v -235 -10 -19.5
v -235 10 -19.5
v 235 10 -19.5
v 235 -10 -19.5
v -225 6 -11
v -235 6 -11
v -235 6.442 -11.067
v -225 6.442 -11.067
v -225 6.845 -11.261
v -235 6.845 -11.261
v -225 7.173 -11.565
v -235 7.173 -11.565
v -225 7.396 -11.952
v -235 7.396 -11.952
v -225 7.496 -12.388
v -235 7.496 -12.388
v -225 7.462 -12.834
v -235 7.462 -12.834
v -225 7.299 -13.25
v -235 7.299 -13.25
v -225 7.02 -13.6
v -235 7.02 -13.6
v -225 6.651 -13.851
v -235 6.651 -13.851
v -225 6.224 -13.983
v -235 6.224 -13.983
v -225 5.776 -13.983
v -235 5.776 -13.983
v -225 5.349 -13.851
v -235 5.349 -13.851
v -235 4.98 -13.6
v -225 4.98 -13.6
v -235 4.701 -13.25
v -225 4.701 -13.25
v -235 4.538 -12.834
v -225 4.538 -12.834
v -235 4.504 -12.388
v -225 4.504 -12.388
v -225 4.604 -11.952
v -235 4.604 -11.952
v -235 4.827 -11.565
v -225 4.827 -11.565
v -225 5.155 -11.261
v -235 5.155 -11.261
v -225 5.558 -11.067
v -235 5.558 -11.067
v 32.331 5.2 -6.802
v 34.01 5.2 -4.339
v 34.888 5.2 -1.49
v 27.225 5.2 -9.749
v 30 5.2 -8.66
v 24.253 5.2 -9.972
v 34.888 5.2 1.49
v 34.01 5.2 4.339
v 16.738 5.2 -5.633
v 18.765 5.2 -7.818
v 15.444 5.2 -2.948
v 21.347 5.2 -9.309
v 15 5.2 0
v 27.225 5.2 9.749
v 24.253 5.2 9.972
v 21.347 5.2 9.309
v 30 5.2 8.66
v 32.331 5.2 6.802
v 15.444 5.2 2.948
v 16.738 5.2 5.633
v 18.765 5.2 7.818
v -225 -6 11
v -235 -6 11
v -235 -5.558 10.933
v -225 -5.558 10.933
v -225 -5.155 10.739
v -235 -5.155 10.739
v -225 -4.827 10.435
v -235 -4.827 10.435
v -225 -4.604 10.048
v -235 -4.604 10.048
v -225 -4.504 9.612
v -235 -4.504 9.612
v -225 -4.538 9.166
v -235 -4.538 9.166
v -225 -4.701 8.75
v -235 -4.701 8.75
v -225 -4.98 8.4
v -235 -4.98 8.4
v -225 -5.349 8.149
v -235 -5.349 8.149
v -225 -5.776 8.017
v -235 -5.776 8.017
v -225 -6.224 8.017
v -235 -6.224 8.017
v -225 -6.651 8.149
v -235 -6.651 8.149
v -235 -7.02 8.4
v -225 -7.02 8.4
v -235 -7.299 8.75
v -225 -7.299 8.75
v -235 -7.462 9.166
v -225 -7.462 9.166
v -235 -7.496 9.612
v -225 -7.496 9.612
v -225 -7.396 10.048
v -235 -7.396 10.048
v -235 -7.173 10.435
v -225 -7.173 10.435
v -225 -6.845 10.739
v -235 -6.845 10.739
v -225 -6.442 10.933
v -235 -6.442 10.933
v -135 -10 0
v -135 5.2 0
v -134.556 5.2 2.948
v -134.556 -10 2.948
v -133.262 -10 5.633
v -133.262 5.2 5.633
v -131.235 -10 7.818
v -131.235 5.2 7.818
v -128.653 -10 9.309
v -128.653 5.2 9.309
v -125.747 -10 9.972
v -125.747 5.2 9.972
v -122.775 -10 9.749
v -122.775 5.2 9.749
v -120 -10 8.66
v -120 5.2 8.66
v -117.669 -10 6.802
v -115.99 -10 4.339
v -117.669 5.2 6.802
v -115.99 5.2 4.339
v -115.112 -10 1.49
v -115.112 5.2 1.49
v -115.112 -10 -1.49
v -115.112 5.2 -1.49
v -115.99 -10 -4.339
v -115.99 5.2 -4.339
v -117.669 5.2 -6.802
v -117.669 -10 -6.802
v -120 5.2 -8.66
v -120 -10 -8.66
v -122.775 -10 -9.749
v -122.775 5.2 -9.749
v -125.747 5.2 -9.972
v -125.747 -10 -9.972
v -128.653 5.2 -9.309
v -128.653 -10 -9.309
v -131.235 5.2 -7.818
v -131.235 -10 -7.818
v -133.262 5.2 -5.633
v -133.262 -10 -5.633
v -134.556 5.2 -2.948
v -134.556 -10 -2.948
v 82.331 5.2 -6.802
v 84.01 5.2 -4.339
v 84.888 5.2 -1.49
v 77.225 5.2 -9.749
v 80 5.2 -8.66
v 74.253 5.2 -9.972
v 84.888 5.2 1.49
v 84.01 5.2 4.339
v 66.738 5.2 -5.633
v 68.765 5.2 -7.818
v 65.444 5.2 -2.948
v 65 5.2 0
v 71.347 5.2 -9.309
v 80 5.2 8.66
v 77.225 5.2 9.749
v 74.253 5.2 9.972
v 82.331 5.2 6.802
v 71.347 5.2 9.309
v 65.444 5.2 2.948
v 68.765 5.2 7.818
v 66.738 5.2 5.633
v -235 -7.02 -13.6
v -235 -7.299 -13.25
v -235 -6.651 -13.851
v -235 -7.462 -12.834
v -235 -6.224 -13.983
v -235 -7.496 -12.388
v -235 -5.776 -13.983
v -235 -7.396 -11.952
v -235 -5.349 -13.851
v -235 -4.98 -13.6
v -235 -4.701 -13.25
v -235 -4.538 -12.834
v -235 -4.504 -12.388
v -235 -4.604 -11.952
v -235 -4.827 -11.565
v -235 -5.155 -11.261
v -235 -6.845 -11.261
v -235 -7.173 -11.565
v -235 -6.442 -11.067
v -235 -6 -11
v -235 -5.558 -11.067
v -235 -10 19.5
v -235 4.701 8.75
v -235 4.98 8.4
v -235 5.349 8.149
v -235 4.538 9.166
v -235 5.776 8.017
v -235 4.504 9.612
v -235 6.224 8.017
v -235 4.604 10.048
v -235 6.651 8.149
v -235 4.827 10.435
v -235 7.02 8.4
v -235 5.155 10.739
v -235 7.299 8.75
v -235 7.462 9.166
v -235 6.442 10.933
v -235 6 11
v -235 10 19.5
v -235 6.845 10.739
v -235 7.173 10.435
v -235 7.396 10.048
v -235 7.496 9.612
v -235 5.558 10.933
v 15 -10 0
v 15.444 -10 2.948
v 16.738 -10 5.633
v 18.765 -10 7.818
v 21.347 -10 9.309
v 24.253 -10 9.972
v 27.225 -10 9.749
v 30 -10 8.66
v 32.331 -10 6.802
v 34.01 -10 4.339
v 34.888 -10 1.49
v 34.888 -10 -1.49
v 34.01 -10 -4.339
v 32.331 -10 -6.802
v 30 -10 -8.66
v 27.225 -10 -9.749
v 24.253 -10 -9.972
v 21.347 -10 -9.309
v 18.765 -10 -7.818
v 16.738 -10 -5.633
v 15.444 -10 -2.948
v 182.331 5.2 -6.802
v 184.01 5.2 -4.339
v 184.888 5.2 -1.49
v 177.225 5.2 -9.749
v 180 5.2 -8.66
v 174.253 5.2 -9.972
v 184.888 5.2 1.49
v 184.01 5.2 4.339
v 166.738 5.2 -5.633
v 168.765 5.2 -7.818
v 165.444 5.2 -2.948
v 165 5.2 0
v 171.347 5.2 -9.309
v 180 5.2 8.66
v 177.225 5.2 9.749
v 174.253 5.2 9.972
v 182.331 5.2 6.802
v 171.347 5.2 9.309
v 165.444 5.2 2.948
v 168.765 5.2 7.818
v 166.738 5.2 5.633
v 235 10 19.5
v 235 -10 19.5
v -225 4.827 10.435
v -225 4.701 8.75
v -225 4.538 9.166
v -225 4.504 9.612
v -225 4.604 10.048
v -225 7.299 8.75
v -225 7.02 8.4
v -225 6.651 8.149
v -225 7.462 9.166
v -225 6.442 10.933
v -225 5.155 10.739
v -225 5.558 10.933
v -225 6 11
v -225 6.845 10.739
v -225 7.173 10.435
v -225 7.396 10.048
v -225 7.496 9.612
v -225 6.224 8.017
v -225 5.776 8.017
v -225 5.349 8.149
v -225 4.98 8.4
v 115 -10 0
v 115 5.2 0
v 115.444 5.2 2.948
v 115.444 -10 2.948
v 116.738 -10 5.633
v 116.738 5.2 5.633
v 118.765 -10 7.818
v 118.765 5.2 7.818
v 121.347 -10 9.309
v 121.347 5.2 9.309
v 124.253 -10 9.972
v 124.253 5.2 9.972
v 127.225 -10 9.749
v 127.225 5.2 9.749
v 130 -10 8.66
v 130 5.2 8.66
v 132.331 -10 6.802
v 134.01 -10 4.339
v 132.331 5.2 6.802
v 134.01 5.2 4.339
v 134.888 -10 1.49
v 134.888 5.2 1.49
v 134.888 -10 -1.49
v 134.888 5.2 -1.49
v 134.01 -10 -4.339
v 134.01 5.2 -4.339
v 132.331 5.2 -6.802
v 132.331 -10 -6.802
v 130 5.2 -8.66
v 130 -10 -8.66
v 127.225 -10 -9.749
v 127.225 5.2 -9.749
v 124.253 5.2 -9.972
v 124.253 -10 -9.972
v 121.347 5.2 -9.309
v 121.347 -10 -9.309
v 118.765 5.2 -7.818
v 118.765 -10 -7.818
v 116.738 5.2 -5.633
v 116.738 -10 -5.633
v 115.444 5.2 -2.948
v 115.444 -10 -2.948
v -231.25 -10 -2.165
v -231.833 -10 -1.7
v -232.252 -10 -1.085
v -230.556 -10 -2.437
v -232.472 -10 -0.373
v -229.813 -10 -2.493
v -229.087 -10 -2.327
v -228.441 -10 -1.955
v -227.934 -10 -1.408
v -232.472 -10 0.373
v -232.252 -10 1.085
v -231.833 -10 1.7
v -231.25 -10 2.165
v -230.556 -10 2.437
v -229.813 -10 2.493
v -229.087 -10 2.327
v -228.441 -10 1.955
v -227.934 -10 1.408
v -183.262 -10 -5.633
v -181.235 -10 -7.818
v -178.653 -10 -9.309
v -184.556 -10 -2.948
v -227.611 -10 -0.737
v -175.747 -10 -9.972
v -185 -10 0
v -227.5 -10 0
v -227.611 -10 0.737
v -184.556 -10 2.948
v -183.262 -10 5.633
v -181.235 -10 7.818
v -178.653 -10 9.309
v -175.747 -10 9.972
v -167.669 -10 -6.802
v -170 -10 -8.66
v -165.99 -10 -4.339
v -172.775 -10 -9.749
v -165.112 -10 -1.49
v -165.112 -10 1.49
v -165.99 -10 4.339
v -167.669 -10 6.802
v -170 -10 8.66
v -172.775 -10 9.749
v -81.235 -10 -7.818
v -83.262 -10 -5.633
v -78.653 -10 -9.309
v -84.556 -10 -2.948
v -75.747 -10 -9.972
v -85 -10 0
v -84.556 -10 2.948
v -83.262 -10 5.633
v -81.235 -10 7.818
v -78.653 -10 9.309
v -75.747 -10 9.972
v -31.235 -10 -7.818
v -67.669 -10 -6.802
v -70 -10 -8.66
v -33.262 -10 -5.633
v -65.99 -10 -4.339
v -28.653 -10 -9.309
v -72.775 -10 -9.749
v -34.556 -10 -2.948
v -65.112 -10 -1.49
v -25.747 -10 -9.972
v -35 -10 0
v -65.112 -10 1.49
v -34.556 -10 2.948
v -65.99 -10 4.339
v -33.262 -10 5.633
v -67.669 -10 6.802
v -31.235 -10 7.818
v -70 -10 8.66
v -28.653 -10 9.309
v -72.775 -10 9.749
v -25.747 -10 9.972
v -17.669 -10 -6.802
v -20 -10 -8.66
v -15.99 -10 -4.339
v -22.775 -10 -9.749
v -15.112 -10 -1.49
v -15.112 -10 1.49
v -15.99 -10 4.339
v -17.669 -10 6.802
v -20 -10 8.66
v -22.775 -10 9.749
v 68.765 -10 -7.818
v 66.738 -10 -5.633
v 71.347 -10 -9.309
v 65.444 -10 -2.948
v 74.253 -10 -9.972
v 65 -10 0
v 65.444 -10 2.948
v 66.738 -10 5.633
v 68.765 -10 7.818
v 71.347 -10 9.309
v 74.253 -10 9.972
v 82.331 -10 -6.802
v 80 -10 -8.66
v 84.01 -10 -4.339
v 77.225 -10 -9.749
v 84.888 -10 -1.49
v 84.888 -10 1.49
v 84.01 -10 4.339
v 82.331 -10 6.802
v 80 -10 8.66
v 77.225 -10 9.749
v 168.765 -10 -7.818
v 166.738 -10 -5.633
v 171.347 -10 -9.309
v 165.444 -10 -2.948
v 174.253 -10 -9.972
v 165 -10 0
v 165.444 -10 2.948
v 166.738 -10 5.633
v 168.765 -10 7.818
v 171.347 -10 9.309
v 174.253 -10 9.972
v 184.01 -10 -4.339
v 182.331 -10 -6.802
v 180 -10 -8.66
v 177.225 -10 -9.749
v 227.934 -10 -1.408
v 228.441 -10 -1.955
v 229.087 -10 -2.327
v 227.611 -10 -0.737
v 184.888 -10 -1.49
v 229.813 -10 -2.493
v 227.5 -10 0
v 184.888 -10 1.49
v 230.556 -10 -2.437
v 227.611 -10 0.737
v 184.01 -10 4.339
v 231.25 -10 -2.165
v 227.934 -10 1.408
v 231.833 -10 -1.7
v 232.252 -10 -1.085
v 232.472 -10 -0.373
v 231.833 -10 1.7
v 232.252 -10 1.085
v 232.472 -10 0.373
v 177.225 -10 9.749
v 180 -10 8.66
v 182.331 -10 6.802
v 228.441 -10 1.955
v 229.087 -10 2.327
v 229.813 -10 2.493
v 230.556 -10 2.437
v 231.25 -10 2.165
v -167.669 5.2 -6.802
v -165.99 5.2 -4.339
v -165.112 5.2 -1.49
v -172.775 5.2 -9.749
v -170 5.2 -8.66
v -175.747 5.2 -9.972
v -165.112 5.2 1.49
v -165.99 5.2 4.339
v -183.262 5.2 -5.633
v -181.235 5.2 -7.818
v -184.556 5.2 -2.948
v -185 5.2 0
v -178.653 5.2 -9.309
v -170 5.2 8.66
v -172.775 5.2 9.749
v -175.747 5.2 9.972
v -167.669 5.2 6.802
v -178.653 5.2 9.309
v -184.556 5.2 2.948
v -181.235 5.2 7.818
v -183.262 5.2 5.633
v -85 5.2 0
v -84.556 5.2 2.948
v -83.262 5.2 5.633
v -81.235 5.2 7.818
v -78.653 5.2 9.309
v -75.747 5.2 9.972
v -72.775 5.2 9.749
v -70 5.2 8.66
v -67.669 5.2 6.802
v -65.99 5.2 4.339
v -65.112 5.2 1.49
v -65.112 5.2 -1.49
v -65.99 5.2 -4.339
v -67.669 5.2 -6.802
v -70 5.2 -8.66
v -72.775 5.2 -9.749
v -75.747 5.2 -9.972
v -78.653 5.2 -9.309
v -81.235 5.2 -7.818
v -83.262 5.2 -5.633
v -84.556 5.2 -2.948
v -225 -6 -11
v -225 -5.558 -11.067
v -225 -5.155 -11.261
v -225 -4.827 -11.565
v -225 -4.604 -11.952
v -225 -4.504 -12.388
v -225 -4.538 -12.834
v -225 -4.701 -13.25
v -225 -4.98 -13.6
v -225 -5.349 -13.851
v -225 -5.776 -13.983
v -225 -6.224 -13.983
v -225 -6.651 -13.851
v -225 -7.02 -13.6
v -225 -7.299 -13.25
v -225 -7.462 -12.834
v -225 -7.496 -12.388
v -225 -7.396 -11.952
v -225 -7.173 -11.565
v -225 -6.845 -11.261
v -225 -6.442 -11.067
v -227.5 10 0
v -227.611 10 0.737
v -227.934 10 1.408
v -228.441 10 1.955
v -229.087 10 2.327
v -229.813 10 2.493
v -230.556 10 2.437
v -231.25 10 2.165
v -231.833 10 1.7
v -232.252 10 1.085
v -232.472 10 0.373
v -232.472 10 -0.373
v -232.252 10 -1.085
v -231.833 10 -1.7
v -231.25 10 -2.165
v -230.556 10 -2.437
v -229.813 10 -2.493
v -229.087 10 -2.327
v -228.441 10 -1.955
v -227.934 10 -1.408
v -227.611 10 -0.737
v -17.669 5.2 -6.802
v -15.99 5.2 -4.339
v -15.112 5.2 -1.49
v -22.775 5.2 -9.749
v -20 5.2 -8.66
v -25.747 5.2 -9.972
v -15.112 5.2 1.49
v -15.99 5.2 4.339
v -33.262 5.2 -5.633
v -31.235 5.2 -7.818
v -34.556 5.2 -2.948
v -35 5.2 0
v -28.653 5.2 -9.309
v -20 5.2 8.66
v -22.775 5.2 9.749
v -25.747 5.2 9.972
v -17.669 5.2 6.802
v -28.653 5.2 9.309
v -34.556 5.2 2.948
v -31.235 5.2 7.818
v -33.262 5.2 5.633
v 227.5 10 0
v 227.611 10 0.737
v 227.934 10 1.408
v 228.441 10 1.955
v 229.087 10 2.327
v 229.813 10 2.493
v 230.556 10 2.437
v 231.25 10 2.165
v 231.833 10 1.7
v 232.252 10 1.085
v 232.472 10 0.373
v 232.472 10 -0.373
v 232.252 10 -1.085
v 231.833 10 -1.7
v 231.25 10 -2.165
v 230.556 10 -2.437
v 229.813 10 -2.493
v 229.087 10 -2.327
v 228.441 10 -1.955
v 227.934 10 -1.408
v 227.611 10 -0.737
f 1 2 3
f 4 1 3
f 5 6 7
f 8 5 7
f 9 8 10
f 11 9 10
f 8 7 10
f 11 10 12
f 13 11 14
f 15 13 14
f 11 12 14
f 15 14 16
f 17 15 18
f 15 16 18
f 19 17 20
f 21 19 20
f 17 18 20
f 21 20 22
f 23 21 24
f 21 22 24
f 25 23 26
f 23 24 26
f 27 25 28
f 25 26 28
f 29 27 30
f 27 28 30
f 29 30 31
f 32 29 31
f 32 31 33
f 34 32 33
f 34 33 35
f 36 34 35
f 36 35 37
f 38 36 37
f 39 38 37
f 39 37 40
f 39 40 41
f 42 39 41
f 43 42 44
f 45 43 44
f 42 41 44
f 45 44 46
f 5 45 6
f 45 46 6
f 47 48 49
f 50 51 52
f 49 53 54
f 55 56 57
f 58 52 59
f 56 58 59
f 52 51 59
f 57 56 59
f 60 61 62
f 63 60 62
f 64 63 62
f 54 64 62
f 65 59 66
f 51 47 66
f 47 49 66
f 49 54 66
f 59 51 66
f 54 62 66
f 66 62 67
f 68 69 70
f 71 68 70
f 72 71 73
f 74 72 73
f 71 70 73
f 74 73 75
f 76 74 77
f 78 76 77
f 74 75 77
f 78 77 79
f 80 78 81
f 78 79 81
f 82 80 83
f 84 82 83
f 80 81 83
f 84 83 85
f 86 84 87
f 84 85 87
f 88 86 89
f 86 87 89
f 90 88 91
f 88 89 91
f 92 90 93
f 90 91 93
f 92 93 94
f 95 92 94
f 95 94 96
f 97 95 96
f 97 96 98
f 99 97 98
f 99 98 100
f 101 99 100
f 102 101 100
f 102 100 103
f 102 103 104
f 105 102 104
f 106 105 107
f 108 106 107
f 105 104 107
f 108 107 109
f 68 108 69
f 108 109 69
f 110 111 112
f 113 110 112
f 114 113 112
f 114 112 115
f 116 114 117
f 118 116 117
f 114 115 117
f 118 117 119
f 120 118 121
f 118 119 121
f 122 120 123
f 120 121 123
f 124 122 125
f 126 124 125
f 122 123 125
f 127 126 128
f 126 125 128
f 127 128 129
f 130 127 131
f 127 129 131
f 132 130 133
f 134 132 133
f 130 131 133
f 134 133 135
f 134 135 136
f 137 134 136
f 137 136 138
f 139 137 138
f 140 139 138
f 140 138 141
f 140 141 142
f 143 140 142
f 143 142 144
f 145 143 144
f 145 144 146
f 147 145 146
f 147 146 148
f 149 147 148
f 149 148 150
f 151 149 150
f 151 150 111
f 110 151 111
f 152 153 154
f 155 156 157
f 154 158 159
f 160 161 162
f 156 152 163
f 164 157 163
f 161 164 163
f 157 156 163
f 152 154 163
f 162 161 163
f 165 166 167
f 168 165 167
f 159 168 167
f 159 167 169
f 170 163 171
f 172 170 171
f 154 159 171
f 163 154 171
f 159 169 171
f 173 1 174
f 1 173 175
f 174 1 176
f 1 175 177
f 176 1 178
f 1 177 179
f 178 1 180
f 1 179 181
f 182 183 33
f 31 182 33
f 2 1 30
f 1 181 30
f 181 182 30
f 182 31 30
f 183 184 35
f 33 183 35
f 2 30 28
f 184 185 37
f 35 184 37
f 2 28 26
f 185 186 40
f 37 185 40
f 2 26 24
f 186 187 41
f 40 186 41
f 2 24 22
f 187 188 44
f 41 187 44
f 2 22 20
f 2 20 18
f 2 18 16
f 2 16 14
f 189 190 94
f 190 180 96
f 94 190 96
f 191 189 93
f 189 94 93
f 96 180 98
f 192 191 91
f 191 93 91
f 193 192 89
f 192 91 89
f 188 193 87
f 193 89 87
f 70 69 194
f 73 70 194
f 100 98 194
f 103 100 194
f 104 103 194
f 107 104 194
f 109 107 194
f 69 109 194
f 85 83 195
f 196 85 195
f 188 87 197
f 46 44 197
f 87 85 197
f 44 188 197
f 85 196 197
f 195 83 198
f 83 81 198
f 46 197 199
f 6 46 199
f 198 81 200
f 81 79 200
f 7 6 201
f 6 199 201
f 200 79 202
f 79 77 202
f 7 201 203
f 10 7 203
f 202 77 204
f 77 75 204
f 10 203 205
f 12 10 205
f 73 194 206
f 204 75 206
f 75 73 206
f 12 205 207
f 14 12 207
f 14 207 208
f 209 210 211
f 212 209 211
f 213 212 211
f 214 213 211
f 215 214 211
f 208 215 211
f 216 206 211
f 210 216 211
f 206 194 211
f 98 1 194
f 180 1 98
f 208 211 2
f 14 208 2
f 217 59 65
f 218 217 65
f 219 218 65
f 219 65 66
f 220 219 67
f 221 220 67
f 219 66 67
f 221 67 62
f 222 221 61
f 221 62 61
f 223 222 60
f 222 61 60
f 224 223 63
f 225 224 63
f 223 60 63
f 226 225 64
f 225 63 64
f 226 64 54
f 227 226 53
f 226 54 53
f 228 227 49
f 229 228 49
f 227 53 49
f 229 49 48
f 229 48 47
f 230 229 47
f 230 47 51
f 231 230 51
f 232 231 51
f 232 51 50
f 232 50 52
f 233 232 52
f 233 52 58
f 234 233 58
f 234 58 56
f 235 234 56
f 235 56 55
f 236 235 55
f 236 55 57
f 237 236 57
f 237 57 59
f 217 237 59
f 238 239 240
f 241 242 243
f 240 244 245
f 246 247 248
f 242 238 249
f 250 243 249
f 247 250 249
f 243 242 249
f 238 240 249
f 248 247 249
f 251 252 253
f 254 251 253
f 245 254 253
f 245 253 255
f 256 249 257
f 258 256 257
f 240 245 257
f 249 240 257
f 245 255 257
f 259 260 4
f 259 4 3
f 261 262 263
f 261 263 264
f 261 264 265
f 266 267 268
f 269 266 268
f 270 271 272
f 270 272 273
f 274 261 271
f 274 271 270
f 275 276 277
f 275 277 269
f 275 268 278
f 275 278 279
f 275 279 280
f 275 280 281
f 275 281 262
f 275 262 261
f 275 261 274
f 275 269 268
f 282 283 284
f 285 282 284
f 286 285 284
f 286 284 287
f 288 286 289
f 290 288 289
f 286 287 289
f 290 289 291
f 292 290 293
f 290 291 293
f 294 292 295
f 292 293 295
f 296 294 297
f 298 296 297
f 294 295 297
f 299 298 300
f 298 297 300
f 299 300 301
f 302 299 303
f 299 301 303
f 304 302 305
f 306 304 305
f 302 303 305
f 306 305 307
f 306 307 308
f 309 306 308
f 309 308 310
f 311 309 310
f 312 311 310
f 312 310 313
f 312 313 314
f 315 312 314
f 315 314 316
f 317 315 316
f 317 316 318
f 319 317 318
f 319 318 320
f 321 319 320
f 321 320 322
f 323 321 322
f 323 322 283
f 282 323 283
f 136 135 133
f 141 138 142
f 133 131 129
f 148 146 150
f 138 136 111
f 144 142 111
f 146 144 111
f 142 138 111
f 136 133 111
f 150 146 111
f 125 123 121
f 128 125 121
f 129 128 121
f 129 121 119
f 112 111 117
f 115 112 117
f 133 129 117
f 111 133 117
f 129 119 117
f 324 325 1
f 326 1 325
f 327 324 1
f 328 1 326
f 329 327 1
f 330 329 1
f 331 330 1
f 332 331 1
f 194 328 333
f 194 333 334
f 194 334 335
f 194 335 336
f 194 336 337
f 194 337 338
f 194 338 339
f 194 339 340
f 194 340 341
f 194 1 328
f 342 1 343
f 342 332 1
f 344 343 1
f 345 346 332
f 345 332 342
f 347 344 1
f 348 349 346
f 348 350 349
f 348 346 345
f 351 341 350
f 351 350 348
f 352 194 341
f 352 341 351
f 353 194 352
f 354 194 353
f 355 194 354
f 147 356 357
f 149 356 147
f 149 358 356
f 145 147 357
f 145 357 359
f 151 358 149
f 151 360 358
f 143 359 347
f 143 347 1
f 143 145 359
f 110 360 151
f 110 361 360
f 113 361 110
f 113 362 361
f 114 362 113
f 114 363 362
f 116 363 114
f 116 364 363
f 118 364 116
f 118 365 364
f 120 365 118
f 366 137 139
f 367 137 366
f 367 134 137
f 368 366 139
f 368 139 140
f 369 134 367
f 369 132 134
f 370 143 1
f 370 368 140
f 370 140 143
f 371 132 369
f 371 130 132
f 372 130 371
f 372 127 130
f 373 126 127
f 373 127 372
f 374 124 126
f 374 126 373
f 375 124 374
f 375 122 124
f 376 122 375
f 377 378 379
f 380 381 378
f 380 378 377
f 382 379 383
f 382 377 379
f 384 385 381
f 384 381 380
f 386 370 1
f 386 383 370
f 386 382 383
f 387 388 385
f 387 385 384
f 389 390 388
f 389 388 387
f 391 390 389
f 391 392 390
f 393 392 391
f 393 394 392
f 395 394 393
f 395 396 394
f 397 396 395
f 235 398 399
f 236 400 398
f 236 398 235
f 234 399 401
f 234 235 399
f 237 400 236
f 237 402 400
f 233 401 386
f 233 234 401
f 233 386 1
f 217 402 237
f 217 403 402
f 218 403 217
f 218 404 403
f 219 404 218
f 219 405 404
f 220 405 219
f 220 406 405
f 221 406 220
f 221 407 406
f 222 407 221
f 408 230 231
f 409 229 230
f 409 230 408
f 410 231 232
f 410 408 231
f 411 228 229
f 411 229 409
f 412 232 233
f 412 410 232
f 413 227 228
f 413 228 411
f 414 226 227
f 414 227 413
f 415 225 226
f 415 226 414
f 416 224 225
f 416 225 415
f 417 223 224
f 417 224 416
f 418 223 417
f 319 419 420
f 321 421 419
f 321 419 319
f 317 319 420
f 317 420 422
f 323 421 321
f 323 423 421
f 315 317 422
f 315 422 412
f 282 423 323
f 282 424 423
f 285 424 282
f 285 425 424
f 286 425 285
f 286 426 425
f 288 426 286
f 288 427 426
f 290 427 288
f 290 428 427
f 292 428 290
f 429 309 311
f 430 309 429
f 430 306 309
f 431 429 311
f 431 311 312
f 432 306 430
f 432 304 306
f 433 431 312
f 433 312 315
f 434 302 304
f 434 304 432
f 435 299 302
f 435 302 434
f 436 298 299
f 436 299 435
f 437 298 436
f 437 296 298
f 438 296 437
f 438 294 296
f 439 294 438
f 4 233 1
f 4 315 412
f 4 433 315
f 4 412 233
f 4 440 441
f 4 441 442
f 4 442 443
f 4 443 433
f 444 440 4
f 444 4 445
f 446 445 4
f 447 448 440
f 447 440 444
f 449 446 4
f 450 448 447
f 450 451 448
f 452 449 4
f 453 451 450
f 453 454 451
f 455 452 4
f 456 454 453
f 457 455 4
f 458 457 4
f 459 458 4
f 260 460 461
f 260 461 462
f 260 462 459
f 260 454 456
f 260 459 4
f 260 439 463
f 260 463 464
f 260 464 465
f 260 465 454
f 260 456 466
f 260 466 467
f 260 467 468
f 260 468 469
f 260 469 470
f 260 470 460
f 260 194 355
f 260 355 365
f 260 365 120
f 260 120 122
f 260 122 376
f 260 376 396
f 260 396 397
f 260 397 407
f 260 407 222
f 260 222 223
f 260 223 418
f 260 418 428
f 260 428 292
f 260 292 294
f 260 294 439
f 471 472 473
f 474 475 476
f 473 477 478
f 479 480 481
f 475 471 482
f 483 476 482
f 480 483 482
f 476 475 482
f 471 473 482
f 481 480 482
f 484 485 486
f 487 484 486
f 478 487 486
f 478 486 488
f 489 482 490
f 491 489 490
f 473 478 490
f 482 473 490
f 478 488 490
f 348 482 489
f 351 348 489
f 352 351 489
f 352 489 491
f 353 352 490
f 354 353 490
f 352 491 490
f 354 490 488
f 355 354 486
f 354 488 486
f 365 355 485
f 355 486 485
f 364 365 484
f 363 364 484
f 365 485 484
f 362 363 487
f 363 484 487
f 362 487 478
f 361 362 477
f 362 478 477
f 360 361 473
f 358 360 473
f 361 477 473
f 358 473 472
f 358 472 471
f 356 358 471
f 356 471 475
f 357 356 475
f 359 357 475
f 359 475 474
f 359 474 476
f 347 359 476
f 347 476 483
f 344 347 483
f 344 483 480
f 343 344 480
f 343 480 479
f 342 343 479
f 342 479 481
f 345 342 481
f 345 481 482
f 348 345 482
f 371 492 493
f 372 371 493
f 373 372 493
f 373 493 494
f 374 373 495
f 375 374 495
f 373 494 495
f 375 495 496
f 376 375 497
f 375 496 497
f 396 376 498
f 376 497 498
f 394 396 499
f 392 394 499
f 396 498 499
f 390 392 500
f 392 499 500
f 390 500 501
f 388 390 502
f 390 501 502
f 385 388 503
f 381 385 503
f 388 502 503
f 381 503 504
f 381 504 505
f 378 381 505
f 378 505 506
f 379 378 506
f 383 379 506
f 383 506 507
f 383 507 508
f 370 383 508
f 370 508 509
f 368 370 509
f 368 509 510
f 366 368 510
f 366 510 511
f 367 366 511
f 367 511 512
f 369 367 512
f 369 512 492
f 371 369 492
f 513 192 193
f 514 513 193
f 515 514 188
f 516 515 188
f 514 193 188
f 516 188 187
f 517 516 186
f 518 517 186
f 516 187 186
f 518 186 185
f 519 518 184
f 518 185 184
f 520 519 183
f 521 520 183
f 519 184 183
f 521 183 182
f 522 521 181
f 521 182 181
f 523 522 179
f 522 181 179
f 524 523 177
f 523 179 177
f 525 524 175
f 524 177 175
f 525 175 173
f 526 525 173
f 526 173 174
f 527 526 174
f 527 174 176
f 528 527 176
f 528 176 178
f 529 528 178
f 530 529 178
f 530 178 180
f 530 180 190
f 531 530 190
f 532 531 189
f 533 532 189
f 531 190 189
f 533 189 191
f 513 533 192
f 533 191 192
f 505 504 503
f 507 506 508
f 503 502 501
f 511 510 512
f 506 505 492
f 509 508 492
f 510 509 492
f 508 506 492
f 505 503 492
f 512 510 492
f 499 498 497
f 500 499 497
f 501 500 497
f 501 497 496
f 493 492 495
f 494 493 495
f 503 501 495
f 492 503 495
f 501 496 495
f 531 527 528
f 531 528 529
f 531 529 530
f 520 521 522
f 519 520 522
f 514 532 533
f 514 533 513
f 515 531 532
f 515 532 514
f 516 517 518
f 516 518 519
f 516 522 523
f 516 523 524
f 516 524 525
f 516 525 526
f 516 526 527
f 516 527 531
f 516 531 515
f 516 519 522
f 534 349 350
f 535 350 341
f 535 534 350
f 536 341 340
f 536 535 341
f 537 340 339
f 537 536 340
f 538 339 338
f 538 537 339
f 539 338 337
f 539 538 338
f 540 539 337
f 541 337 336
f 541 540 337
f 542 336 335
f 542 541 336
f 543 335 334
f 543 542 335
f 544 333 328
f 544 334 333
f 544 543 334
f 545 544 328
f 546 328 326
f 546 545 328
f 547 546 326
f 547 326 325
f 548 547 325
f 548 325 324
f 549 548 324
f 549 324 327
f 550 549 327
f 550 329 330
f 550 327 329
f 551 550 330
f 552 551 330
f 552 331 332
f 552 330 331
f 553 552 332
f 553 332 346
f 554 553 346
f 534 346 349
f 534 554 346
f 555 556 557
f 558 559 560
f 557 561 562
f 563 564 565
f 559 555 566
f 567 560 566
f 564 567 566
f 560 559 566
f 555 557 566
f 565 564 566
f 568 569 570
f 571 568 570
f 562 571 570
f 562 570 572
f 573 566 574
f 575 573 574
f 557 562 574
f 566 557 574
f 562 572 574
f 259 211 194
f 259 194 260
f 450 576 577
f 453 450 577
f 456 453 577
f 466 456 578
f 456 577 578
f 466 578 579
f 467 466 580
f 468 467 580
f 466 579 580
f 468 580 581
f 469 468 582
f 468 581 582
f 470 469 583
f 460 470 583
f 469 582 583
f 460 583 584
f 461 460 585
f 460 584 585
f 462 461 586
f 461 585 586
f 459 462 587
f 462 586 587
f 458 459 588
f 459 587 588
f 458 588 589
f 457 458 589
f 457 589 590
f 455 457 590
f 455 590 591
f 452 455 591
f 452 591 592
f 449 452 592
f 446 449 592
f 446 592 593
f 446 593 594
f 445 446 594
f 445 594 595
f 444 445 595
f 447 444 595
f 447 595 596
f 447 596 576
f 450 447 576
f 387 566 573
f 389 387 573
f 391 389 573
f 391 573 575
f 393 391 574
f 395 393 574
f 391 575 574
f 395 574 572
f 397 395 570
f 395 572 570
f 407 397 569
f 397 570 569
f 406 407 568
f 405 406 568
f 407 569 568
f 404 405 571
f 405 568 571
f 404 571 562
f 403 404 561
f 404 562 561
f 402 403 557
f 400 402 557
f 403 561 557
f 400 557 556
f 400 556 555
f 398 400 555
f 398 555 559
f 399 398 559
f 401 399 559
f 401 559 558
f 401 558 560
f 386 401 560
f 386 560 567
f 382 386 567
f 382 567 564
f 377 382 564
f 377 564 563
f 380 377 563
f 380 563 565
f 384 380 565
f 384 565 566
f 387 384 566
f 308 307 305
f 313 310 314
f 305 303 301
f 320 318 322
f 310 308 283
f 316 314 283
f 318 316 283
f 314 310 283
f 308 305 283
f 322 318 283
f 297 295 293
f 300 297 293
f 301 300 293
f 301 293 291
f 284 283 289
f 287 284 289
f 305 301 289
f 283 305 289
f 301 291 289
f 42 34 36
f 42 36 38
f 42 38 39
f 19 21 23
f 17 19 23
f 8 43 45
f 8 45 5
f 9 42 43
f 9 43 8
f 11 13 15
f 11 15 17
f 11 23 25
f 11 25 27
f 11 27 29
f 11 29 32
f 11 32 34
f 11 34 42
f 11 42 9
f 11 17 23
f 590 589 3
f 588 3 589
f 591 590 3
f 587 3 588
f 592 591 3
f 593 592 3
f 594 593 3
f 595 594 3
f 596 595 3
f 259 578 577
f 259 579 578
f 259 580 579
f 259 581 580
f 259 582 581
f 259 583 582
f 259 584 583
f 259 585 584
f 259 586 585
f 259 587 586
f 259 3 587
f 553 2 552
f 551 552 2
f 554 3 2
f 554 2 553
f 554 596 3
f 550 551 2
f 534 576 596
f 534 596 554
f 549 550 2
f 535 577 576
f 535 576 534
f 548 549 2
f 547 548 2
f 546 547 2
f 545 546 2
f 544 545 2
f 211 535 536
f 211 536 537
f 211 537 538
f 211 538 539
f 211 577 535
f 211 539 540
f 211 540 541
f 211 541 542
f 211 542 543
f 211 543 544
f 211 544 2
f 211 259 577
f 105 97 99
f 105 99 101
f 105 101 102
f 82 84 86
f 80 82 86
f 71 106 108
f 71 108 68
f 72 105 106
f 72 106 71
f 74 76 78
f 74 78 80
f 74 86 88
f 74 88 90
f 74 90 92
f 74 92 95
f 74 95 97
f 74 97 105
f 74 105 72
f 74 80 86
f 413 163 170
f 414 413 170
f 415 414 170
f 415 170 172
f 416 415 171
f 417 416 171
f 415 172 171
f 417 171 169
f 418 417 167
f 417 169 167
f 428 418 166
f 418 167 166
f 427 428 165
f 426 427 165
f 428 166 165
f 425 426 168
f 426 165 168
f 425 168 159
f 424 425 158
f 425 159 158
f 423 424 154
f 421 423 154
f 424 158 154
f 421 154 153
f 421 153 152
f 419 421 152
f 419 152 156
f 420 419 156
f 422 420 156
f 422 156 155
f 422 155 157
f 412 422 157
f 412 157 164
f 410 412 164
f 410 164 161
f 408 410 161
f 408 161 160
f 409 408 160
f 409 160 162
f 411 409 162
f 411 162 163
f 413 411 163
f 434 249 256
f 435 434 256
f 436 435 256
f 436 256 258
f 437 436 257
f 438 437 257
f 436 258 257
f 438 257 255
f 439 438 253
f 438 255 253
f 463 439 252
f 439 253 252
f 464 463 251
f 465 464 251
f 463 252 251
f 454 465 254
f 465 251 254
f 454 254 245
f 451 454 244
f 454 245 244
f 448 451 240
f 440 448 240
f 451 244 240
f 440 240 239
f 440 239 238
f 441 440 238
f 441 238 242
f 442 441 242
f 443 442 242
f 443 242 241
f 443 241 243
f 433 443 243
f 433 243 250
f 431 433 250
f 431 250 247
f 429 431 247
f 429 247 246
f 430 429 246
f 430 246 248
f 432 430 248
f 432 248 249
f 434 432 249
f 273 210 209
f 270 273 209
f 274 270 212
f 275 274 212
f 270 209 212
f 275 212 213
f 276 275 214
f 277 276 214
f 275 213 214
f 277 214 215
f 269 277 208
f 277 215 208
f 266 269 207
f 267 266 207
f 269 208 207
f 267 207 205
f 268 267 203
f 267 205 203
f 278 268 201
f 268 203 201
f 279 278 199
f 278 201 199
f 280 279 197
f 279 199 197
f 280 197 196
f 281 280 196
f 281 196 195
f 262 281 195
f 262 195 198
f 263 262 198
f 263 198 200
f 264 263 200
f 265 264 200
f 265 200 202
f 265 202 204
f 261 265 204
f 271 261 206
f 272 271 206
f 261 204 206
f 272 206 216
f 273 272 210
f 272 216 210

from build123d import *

# Parameters (mm, degrees)
SKETCH1_W           = 470
SKETCH1_H           = 20
BOSS_EXTRUDE1_DEPTH = 19.5
SKETCH2_R           = 10
CUT_EXTRUDE1_DEPTH  = 28
LPATTERN1_COUNT     = 8
LPATTERN1_PITCH     = 50
SKETCH3_R           = 2.5
CUT_EXTRUDE2_DEPTH  = 42
SKETCH4_R           = 10
BOSS_EXTRUDE2_DEPTH = 4.8
SKETCH5_R           = 1.5
CUT_EXTRUDE3_DEPTH  = 10


with BuildPart() as part:
    # Sketch1 → Boss-Extrude1 (new, symmetric)
    with BuildSketch(Plane.XY):
        Rectangle(SKETCH1_W, SKETCH1_H)
    extrude(amount=BOSS_EXTRUDE1_DEPTH, both=True)

    # Sketch2 → Cut-Extrude1 (cut)
    with BuildSketch(Plane(origin=(0, 10, 0), x_dir=(1, 0, 0), z_dir=(0, 1, 0))):
        with Locations(Location((-175, 0, 0), (0, 0, 180))):
            Circle(SKETCH2_R)
    cut_extrude1 = extrude(amount=-CUT_EXTRUDE1_DEPTH, mode=Mode.SUBTRACT)

    # LPattern1: Cut-Extrude1 ×8
    with Locations(*[(i * LPATTERN1_PITCH, 0, 0) for i in range(1, LPATTERN1_COUNT)]):
        add(cut_extrude1, mode=Mode.SUBTRACT)

    # Sketch3 → Cut-Extrude2 (cut)
    with BuildSketch(Plane(origin=(0, 10, 0), x_dir=(1, 0, 0), z_dir=(0, 1, 0))):
        with Locations(Location((230, 0, 0), (0, 0, 180))):
            Circle(SKETCH3_R)
    cut_extrude2 = extrude(amount=-CUT_EXTRUDE2_DEPTH, mode=Mode.SUBTRACT)

    # Mirror1: Cut-Extrude2 across plane
    add(cut_extrude2.mirror(Plane(origin=(0, 0, 0), x_dir=(0, 0, 1), z_dir=(1, 0, 0))), mode=Mode.SUBTRACT)

    # Sketch4 → Boss-Extrude2 (add)
    with BuildSketch(Plane(origin=(0, 10, 0), x_dir=(1, 0, 0), z_dir=(0, 1, 0))):
        with Locations(Location((-175, 0, 0), (0, 0, 180))):
            Circle(SKETCH4_R)
        with Locations(Location((-125, 0, 0), (0, 0, 180))):
            Circle(SKETCH4_R)
        with Locations(Location((-75, 0, 0), (0, 0, 180))):
            Circle(SKETCH4_R)
        with Locations(Location((-25, 0, 0), (0, 0, 180))):
            Circle(SKETCH4_R)
        with Locations(Location((25, 0, 0), (0, 0, 180))):
            Circle(SKETCH4_R)
        with Locations(Location((75, 0, 0), (0, 0, 180))):
            Circle(SKETCH4_R)
        with Locations(Location((125, 0, 0), (0, 0, 180))):
            Circle(SKETCH4_R)
        with Locations(Location((175, 0, 0), (0, 0, 180))):
            Circle(SKETCH4_R)
    extrude(amount=-BOSS_EXTRUDE2_DEPTH)

    # Sketch5 → Cut-Extrude3 (cut)
    with BuildSketch(Plane.ZY.offset(235)):
        with Locations((-12.5, 6)):
            Circle(SKETCH5_R)
        with Locations((-12.5, -6)):
            Circle(SKETCH5_R)
        with Locations((9.5, 6)):
            Circle(SKETCH5_R)
        with Locations((9.5, -6)):
            Circle(SKETCH5_R)
    extrude(amount=-CUT_EXTRUDE3_DEPTH, mode=Mode.SUBTRACT)


solid = part.part
